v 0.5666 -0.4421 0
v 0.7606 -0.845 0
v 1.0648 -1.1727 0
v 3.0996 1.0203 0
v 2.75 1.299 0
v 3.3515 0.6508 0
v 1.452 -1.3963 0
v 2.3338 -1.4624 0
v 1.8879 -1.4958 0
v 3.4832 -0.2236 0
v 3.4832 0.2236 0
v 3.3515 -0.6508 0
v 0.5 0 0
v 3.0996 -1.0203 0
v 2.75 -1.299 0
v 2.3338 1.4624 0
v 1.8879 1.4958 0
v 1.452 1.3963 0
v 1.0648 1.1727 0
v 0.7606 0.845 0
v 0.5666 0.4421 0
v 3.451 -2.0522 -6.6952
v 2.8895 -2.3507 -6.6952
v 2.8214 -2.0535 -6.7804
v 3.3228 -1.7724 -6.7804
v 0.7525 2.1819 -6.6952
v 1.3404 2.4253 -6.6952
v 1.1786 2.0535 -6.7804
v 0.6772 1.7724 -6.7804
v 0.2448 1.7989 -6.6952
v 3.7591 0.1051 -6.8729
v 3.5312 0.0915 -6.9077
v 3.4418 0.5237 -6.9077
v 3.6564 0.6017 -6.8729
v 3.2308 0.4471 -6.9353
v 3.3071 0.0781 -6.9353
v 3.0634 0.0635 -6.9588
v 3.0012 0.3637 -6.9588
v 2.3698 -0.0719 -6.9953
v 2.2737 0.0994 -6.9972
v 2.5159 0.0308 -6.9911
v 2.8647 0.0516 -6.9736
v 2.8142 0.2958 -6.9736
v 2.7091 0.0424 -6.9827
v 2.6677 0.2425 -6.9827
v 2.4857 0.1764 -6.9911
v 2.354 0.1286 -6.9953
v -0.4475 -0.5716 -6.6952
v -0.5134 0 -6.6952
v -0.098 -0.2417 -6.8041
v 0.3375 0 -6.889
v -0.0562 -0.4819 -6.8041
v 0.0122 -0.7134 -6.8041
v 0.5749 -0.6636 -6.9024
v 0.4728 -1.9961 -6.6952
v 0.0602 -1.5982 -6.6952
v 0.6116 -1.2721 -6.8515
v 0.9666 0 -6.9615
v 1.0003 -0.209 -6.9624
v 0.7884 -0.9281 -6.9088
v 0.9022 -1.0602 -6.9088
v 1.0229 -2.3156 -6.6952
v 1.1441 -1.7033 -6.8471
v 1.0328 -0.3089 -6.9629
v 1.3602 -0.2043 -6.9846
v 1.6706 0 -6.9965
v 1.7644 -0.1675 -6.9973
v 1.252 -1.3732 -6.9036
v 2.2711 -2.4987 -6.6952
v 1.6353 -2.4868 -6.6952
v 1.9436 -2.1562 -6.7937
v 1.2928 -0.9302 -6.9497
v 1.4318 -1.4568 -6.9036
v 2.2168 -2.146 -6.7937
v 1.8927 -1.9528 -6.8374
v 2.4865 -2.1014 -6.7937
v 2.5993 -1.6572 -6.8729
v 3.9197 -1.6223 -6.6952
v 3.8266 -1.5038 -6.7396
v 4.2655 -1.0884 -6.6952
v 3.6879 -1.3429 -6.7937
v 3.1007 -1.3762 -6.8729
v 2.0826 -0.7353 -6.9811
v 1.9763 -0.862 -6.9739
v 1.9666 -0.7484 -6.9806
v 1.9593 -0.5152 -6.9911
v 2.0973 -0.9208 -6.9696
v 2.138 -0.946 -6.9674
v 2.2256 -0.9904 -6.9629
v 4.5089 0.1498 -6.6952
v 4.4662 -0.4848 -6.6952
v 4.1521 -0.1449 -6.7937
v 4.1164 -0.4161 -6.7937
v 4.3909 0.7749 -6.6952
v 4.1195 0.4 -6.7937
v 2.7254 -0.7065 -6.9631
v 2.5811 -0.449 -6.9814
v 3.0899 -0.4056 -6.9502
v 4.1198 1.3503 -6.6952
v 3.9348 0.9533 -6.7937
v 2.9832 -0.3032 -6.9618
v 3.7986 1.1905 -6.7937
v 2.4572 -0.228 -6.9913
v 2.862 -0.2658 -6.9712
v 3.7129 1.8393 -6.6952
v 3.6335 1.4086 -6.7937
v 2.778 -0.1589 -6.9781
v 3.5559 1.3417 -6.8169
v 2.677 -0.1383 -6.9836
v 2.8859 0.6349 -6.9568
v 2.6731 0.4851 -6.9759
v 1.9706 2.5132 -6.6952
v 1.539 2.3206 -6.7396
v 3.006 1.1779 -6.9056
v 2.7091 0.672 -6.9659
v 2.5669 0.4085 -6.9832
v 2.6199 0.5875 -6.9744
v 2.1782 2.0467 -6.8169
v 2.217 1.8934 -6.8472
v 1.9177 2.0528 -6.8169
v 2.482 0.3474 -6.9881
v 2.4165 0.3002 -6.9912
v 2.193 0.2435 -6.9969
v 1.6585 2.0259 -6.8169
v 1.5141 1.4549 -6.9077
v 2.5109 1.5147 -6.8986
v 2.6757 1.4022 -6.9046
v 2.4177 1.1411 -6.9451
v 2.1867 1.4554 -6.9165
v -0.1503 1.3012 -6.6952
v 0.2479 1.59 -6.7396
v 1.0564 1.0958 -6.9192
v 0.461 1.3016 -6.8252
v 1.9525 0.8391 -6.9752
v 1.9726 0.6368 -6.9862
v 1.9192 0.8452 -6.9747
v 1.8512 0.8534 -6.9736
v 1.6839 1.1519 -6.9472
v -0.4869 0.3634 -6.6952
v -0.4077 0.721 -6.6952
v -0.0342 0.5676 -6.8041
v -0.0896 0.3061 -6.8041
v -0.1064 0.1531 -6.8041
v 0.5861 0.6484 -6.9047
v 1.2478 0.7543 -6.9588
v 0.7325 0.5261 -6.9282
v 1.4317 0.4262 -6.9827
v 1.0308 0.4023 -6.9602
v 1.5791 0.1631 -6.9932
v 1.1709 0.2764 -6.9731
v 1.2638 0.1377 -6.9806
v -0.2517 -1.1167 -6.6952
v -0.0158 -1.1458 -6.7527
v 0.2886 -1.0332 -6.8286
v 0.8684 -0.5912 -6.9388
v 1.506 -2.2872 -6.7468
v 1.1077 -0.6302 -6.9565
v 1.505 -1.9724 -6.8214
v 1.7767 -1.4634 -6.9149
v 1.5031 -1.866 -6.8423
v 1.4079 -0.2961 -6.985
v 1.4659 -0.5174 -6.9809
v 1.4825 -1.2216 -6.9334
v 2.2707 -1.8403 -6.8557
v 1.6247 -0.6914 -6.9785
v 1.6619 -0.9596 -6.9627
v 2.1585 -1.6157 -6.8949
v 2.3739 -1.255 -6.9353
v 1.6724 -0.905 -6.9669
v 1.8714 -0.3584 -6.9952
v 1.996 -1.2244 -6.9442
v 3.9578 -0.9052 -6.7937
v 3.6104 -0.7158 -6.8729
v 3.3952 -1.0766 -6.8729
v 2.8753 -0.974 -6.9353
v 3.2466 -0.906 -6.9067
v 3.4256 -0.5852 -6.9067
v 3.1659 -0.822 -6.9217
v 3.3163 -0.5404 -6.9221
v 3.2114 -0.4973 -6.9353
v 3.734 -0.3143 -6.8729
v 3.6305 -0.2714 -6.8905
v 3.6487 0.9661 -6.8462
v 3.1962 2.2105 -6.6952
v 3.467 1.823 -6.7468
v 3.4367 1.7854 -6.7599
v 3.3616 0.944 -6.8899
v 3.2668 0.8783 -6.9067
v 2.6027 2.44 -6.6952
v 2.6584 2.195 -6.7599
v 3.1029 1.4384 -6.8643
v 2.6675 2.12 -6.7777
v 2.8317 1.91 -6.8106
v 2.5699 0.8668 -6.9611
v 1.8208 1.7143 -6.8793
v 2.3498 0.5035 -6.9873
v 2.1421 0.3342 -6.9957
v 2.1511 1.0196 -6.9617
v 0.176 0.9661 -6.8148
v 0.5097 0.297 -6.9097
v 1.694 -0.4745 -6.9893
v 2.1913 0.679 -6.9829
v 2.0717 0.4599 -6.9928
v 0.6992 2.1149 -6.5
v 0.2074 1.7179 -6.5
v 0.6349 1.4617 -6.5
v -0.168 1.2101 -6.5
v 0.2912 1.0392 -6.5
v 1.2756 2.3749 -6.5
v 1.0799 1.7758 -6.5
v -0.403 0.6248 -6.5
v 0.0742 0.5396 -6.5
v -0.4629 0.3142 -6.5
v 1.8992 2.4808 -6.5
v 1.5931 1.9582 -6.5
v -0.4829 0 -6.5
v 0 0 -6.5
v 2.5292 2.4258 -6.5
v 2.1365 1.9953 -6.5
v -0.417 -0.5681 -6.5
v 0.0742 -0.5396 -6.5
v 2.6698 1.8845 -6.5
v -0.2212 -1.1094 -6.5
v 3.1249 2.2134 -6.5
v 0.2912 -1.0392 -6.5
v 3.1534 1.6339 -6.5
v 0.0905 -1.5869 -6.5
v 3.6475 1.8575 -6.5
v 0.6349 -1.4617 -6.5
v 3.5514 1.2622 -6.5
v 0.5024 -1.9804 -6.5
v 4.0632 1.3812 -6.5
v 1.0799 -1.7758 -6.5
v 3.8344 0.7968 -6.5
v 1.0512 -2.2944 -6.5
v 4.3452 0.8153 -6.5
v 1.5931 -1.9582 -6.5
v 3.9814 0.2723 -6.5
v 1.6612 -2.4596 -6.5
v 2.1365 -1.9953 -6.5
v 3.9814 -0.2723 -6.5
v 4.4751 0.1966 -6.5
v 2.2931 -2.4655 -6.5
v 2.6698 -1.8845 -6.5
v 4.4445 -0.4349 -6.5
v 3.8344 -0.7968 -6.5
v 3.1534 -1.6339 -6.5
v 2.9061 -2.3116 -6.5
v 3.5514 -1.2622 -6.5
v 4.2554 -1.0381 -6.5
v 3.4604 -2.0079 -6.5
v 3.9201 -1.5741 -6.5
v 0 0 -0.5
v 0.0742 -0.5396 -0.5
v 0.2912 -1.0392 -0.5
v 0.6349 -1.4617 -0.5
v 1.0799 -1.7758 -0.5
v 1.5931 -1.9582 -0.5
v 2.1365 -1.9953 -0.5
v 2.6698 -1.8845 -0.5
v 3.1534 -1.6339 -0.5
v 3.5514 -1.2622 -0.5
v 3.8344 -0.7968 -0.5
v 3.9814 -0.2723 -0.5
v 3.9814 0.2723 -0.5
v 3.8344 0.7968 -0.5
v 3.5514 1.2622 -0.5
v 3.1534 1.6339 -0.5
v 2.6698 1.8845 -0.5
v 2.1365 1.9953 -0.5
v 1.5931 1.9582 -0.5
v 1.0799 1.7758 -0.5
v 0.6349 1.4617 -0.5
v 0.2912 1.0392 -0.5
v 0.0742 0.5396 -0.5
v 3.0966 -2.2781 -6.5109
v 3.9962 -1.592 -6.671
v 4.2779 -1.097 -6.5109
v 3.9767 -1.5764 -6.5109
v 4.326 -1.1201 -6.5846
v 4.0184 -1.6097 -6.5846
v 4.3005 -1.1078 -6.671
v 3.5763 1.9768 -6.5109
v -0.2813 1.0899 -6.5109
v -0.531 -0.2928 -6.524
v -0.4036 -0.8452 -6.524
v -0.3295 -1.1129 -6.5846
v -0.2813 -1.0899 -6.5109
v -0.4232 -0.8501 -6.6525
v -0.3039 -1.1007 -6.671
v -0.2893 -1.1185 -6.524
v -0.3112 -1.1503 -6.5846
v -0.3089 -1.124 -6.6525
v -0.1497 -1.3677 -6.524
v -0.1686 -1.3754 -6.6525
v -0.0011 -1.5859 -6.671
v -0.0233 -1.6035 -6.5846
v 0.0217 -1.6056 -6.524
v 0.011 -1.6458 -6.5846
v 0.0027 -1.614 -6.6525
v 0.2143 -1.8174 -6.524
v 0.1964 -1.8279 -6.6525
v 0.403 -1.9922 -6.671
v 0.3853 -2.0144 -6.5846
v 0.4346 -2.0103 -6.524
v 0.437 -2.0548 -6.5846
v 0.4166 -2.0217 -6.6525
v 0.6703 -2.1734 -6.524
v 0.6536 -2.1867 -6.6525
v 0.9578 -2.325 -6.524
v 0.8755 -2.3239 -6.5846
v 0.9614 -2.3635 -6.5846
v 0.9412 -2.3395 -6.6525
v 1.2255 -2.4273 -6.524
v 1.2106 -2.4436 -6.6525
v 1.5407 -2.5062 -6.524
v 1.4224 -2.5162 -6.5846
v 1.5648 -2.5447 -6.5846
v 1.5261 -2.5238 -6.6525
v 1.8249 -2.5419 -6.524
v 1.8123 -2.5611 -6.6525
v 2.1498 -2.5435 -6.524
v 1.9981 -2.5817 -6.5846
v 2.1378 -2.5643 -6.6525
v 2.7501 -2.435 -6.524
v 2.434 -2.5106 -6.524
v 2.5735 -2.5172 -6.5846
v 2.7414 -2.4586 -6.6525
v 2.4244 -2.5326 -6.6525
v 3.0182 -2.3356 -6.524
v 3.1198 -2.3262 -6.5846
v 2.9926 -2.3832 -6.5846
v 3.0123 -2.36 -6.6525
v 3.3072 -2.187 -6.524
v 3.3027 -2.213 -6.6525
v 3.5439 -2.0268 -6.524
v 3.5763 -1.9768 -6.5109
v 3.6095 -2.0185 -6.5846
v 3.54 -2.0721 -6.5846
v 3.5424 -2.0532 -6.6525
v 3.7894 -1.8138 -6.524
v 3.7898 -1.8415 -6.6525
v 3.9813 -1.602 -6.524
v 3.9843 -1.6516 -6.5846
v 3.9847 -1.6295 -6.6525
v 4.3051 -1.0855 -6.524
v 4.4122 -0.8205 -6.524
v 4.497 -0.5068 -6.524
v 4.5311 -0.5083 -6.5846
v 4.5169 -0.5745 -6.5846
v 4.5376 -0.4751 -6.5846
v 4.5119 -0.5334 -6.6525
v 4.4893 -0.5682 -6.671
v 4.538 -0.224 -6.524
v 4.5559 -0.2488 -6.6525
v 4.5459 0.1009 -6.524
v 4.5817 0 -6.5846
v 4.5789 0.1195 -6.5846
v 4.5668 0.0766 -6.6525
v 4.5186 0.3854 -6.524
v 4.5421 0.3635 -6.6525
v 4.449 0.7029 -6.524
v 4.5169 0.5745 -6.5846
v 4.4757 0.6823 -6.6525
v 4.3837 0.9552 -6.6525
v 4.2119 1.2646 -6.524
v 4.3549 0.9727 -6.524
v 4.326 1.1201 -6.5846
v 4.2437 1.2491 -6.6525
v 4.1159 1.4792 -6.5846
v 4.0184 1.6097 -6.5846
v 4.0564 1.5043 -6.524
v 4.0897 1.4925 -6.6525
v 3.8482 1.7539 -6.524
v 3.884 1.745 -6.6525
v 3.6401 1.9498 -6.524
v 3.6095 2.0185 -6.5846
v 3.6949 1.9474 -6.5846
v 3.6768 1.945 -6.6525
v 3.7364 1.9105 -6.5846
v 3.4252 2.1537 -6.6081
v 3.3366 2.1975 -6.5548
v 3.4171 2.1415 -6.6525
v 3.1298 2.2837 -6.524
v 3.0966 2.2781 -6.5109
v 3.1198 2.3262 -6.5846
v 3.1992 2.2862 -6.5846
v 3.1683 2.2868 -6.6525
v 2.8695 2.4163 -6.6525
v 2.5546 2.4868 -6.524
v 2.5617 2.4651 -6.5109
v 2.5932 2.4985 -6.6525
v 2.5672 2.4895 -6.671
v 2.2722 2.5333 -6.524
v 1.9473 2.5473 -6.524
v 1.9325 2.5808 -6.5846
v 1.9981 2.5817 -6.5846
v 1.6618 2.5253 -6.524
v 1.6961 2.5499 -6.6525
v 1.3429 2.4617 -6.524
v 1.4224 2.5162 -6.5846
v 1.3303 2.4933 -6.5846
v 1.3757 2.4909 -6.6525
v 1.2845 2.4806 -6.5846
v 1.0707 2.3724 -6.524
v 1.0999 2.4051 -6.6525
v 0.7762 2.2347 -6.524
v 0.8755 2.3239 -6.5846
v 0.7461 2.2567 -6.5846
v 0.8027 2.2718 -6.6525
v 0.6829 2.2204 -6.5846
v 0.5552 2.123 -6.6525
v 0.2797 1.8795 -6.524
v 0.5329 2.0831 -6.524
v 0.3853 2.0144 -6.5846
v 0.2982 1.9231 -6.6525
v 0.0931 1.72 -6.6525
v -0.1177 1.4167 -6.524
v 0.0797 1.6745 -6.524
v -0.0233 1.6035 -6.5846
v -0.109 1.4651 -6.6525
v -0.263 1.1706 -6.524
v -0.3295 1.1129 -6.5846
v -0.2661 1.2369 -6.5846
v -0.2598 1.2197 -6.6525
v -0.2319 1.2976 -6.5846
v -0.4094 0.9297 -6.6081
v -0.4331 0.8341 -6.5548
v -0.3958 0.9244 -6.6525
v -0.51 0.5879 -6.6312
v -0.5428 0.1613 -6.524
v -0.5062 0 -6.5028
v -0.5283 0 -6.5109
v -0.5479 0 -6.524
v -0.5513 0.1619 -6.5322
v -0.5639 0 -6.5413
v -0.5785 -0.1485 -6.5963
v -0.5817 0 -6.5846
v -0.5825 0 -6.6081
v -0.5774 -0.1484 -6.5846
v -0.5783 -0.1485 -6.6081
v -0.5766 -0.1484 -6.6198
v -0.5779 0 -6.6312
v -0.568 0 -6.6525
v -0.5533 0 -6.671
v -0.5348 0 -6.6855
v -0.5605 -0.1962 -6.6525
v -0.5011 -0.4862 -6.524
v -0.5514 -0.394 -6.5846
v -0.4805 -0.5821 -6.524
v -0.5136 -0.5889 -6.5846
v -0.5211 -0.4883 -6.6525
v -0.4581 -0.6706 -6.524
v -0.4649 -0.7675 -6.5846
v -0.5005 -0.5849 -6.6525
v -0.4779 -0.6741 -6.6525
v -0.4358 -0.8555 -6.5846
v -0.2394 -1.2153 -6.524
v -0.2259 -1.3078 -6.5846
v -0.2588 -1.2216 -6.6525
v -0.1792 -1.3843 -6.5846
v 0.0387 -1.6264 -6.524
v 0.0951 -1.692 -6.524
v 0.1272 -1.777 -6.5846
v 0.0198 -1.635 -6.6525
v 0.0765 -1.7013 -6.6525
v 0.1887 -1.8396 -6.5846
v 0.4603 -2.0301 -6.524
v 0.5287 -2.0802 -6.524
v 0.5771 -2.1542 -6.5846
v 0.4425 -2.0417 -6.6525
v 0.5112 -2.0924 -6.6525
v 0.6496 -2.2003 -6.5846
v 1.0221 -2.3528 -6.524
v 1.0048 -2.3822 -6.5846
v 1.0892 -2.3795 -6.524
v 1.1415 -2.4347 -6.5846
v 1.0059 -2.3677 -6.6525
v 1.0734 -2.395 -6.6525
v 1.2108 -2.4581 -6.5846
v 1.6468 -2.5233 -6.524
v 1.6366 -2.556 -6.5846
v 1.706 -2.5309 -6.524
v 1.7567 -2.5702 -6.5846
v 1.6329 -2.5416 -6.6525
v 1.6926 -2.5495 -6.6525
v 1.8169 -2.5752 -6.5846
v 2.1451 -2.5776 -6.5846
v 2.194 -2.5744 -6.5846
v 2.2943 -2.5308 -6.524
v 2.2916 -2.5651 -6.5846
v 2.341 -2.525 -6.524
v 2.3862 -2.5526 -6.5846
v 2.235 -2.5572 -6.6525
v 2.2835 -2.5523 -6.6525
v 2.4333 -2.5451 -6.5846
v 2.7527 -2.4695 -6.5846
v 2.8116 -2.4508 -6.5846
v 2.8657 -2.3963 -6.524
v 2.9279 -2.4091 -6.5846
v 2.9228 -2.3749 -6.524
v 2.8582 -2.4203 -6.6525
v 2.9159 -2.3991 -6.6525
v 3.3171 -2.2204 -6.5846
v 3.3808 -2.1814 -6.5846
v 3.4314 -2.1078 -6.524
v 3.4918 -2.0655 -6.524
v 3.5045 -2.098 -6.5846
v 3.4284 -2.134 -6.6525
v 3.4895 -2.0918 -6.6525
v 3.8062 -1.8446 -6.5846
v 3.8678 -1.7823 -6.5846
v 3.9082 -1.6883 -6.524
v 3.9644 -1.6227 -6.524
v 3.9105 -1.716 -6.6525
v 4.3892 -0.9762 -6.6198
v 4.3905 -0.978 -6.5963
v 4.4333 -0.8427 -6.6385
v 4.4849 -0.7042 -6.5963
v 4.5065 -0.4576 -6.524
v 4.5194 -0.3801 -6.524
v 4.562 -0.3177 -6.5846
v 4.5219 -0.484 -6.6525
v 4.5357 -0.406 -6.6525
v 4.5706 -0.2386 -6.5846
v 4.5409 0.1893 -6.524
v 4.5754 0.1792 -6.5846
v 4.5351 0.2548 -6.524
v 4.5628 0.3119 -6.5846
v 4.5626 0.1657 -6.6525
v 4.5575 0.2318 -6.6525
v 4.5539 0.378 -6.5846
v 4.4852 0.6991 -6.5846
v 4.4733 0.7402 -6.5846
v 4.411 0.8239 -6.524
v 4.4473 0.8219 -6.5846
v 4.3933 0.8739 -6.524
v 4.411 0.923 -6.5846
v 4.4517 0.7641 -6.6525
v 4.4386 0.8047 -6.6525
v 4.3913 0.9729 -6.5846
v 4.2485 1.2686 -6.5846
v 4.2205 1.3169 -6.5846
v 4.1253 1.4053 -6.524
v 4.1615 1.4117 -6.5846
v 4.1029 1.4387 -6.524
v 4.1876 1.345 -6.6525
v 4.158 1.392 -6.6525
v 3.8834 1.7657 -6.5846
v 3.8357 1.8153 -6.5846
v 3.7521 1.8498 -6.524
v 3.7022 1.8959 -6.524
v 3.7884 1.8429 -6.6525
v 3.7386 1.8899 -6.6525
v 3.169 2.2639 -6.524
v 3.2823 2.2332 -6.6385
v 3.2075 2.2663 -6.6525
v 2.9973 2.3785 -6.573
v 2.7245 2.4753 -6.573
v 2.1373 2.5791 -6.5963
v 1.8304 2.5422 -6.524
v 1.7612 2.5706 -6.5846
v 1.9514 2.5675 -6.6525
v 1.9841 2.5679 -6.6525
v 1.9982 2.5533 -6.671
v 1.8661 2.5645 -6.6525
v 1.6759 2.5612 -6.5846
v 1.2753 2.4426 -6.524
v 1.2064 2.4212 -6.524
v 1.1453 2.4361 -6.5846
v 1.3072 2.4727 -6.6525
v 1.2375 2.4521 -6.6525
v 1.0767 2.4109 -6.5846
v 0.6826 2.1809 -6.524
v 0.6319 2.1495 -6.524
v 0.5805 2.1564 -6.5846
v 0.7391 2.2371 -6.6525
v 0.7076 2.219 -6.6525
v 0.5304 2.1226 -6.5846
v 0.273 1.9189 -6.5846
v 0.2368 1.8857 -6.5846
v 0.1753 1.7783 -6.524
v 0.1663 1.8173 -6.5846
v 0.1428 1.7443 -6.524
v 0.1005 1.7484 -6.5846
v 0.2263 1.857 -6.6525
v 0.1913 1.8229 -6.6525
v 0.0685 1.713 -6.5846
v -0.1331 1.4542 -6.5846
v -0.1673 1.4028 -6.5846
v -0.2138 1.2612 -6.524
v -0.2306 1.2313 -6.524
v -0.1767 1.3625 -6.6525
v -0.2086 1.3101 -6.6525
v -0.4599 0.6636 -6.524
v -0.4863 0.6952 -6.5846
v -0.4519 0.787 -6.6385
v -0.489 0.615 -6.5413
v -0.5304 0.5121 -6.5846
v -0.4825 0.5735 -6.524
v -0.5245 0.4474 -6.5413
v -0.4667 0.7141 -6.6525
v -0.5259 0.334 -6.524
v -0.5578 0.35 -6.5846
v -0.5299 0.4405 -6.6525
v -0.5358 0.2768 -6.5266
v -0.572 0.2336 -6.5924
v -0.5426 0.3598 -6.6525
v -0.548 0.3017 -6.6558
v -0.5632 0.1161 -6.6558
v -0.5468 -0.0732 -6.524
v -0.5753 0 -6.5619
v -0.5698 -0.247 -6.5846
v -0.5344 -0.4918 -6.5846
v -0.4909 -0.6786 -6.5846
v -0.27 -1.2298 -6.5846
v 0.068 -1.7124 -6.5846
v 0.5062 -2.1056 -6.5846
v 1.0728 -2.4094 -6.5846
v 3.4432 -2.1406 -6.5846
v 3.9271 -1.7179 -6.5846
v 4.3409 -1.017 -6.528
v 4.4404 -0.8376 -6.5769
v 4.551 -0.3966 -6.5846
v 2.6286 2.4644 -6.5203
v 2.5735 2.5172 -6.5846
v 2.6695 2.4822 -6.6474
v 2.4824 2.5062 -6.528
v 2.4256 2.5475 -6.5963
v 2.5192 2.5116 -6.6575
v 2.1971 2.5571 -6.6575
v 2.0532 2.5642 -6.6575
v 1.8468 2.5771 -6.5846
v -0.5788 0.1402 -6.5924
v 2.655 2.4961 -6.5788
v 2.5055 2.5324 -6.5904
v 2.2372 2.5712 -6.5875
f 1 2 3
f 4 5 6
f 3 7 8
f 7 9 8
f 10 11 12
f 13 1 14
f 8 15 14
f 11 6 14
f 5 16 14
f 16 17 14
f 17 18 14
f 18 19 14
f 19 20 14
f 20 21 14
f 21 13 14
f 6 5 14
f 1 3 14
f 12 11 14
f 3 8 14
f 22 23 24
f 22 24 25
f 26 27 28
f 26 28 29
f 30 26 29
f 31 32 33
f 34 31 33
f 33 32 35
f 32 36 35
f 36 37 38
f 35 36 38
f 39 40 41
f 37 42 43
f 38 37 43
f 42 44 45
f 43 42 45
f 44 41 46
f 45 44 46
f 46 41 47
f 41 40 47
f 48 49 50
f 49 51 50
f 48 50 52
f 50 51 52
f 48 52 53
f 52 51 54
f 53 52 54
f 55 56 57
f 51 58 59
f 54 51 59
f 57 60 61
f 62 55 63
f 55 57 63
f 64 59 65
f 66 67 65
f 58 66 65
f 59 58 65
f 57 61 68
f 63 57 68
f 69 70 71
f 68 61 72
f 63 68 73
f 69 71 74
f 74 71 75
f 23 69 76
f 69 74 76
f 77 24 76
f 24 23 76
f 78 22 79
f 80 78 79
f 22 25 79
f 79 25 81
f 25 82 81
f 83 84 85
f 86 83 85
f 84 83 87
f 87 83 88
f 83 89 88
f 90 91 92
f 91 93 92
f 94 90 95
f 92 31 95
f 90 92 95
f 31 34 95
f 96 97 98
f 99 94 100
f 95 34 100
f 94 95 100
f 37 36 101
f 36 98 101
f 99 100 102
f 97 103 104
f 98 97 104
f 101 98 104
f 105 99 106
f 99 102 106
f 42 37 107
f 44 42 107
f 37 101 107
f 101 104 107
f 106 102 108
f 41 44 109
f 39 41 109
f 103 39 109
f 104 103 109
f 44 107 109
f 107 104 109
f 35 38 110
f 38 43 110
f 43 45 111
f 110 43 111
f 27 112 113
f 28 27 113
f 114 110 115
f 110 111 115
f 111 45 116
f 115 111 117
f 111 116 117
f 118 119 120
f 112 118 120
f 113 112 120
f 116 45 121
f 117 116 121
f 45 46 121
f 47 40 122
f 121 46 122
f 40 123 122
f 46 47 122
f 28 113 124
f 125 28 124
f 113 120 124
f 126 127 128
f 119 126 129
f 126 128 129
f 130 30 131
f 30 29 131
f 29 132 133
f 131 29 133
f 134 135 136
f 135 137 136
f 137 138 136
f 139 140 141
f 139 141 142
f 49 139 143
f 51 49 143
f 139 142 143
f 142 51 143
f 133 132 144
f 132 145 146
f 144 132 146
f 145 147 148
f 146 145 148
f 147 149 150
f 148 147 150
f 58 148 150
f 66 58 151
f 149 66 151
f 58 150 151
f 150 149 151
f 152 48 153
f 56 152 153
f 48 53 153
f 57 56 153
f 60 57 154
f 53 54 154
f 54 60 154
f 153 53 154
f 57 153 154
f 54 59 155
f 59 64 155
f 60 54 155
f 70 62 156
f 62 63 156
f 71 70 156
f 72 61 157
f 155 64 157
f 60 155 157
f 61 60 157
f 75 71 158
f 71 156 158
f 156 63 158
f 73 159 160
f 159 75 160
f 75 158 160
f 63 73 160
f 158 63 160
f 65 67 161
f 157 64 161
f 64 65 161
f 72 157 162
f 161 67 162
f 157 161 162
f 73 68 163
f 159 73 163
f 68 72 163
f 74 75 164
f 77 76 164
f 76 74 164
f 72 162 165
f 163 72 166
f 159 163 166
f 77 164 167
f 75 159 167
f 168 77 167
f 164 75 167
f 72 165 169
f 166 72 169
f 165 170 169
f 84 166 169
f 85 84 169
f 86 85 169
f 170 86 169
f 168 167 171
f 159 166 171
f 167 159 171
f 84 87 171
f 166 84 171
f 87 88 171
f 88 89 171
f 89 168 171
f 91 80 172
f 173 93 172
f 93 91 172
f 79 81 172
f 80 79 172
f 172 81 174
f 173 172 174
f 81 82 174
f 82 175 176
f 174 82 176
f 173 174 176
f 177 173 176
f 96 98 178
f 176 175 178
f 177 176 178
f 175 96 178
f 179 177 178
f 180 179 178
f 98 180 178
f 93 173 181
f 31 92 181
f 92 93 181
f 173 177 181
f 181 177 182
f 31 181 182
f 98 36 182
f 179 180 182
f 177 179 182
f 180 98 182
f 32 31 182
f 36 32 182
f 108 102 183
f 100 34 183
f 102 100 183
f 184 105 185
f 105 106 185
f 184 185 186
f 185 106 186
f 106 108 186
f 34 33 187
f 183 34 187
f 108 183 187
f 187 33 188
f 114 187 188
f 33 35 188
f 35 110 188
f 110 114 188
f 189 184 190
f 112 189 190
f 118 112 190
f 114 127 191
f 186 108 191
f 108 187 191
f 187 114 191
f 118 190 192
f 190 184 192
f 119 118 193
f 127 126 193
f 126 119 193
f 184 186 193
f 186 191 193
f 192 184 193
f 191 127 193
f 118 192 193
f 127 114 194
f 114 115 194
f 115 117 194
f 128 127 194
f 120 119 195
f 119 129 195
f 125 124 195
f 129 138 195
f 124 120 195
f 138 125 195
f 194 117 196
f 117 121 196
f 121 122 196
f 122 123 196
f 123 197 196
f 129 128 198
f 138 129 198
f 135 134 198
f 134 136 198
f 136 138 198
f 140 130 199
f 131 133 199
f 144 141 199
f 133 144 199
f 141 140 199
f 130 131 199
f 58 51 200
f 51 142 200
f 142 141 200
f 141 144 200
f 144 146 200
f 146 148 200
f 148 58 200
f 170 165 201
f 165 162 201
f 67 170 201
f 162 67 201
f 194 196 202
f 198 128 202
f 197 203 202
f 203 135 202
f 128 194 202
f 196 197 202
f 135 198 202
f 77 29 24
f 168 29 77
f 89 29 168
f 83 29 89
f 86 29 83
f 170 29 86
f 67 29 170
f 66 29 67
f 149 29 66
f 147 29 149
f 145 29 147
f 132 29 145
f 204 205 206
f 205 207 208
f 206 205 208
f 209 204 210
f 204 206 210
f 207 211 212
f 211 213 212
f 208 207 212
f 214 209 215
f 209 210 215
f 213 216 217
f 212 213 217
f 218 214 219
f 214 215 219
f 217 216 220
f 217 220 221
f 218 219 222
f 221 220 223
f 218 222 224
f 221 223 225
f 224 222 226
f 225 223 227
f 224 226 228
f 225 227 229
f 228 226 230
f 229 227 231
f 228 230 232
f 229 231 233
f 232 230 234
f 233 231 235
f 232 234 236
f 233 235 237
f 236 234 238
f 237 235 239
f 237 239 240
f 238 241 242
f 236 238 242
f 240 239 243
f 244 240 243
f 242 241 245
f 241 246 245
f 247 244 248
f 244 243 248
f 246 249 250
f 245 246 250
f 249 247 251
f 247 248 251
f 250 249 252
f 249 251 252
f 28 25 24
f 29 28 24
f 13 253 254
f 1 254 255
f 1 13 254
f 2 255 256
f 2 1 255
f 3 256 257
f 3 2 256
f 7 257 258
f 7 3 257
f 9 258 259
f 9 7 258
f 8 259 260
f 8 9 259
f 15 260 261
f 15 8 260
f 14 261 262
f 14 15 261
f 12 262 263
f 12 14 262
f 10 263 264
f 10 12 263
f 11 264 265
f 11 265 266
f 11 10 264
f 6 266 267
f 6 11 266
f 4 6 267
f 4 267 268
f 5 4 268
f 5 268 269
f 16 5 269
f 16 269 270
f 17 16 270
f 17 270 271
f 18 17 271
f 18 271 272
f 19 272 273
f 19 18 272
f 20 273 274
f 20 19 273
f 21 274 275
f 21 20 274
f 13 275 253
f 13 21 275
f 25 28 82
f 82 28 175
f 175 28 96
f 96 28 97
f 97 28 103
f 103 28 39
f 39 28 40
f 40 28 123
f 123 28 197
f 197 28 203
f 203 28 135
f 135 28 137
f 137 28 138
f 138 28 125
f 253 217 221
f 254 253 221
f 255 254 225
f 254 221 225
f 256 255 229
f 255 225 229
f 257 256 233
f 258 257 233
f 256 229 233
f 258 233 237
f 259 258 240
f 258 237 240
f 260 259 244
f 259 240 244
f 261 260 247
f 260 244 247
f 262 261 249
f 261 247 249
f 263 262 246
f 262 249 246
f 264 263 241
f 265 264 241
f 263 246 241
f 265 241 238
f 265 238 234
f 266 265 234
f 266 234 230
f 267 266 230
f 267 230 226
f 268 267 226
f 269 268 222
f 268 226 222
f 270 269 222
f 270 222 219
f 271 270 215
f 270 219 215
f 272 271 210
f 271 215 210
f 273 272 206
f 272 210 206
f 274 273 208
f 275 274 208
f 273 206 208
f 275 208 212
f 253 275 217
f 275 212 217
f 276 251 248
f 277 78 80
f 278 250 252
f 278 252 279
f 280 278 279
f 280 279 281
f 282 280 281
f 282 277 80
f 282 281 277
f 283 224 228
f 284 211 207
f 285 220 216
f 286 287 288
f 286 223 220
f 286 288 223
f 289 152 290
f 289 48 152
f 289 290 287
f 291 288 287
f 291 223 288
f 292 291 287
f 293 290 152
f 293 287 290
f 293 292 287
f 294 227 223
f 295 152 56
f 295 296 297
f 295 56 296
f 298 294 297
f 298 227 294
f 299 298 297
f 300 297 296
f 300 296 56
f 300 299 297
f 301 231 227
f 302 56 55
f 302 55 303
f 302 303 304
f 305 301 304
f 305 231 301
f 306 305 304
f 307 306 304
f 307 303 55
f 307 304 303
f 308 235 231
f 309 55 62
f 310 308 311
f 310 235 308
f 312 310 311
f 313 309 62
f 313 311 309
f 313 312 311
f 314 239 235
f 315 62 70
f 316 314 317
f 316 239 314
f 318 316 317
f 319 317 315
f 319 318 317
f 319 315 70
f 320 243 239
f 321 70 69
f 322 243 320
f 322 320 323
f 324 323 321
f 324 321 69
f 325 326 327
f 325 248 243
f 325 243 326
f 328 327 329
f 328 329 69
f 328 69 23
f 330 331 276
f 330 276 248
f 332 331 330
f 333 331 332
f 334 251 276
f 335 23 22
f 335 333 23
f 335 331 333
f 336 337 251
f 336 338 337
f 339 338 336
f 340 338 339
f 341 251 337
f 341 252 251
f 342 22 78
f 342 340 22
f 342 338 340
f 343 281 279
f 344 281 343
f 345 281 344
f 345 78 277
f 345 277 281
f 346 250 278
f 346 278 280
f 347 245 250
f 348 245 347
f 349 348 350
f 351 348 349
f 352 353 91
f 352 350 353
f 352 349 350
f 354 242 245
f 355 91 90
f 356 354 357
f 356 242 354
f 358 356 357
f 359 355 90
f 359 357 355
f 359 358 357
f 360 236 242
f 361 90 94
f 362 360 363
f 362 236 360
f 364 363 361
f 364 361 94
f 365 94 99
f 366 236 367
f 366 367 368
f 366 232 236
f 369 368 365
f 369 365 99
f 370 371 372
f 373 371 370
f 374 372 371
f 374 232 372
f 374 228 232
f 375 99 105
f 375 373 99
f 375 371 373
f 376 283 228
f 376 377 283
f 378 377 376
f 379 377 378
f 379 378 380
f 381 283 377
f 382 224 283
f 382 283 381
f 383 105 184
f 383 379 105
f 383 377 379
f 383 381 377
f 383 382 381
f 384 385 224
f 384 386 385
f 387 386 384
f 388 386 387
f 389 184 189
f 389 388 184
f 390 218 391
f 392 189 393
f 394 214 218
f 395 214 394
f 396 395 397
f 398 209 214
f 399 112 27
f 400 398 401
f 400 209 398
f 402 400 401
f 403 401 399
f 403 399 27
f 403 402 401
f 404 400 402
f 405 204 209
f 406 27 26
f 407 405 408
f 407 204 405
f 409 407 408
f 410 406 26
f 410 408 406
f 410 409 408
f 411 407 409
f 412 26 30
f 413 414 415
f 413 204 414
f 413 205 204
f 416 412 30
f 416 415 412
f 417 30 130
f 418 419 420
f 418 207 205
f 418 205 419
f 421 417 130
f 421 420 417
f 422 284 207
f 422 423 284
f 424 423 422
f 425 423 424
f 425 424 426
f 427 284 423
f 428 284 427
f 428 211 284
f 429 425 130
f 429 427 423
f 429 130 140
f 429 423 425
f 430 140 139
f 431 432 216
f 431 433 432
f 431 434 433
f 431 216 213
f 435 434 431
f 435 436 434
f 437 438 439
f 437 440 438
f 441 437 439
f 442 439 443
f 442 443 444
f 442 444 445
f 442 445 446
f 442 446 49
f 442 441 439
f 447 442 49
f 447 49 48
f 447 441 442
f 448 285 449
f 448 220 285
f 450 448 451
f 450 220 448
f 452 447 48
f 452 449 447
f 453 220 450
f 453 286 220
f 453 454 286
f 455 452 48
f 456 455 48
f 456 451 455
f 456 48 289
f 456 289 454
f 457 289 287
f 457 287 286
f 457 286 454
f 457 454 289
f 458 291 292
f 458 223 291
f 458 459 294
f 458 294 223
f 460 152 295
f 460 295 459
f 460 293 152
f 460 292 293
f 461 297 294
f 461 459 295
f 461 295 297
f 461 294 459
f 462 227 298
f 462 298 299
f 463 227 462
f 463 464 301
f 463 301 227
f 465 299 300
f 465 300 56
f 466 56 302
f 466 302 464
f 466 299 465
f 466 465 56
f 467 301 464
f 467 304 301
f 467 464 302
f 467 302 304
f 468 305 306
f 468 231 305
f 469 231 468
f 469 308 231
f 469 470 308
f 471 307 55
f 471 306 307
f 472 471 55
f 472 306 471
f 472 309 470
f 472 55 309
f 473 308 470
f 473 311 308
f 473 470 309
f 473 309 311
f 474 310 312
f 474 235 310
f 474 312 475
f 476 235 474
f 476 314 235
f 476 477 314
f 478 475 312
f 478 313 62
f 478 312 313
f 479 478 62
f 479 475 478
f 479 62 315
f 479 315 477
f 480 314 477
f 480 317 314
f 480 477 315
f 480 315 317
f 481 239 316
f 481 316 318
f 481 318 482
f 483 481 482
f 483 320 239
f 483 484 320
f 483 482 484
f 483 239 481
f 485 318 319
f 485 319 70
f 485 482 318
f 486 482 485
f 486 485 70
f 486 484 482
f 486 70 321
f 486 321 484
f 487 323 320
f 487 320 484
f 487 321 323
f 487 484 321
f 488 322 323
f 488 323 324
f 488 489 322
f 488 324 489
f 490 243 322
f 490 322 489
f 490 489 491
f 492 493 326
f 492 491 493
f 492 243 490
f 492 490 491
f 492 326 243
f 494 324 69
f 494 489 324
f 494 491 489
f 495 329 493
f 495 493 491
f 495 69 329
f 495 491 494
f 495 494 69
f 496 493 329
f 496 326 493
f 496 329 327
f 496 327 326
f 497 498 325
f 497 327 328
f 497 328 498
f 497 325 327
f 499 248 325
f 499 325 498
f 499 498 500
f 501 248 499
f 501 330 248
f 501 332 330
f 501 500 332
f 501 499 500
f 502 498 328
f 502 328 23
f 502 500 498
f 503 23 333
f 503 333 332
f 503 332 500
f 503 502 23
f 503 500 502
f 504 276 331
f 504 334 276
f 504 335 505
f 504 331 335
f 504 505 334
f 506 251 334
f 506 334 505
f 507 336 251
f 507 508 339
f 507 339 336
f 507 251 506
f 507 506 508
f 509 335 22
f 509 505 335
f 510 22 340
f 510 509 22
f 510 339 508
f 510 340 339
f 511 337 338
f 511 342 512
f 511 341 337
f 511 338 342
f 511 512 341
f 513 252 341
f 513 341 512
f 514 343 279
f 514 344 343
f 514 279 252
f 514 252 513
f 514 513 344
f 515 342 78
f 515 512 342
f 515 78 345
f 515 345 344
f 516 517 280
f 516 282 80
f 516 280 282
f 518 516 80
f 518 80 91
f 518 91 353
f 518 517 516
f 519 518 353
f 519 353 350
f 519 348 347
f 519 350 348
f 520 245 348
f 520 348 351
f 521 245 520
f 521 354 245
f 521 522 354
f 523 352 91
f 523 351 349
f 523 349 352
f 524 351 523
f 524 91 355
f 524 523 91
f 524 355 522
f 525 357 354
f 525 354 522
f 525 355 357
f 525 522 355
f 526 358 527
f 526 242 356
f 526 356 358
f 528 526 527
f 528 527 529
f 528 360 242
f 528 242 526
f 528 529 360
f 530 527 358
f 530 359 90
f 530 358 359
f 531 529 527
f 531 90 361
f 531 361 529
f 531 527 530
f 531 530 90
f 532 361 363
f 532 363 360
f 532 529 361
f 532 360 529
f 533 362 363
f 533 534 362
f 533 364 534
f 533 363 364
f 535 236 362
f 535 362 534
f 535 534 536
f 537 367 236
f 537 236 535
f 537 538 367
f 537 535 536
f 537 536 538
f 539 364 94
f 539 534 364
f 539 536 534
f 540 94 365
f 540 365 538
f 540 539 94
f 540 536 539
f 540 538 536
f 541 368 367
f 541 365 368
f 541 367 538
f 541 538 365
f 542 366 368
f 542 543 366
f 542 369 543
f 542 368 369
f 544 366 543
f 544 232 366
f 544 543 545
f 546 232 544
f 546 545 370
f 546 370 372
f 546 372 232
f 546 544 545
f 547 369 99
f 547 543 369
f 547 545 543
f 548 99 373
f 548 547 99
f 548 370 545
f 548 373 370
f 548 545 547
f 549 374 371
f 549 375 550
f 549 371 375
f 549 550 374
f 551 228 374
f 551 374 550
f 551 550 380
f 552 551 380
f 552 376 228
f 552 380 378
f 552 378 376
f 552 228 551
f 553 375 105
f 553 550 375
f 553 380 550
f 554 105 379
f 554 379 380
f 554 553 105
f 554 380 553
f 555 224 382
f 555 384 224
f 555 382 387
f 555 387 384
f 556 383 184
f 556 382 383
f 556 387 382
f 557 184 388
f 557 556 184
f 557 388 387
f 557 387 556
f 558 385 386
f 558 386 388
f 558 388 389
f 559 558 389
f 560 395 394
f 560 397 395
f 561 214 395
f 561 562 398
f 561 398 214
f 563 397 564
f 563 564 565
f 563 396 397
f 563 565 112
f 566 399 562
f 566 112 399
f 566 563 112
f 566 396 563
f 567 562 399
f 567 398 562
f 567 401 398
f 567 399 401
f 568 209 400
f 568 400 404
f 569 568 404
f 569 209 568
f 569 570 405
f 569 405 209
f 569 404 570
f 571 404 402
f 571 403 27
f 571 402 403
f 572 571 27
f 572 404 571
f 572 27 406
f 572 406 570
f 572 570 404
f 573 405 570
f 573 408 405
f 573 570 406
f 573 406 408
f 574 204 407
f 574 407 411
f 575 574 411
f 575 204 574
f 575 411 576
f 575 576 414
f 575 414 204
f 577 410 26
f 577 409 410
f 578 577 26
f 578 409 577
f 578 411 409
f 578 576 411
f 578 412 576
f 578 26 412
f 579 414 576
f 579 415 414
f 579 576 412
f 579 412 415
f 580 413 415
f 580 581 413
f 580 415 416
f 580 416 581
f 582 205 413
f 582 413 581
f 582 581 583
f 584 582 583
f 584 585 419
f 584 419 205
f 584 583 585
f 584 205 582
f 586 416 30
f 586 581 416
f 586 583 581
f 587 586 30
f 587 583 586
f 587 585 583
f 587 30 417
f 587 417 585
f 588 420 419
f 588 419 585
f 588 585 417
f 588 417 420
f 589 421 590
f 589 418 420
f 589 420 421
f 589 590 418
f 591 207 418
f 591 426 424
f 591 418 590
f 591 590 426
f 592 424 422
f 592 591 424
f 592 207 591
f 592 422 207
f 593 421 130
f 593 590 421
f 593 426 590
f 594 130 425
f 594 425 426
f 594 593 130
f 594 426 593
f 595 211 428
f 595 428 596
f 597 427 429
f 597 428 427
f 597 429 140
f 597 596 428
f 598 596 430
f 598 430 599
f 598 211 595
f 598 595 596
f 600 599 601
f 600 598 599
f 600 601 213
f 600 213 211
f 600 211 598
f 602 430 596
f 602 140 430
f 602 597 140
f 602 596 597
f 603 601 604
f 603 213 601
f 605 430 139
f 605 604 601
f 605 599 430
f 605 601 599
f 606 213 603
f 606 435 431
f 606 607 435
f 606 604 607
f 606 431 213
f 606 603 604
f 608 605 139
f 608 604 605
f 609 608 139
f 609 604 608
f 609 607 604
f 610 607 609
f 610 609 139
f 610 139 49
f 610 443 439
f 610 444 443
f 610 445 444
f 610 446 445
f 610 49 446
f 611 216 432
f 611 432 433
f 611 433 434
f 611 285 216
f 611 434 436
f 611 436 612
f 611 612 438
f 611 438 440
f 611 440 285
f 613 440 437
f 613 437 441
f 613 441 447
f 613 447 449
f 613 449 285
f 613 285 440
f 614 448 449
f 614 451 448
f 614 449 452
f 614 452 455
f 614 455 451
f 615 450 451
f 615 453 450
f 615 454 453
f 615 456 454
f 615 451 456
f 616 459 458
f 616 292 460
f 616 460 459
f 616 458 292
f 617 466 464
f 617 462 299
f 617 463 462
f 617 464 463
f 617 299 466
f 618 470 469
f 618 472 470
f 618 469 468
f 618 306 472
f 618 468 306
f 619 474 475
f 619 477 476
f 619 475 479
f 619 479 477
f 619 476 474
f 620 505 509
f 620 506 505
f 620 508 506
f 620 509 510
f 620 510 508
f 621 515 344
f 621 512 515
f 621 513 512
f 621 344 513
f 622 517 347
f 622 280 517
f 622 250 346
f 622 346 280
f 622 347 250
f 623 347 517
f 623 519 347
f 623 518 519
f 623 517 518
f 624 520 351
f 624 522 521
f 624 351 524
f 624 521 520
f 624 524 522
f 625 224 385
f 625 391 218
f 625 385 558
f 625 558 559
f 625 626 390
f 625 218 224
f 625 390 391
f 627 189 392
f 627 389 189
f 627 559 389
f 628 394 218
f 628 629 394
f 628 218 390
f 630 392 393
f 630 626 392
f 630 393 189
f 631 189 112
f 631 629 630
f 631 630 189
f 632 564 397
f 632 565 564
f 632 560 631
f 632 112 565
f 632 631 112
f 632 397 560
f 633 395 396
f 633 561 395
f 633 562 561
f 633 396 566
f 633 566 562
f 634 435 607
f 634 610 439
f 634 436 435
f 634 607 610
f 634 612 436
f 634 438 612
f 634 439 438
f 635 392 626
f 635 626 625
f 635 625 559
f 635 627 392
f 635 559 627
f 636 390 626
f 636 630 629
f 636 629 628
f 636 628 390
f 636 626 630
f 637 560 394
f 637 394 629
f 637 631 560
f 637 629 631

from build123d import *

# Parameters (mm, degrees)
CONG_1_R                = 0.1
CHANFREIN1_SIZE         = 0.5
ESQUISSE4_W             = 0.574782946
ESQUISSE4_H             = 1.352018642
ENL_V_MAT_EXTRU_1_DEPTH = 10


with BuildPart() as part:
    # Esquisse1 → Révolution1 (revolve)
    with BuildSketch(Plane(origin=(0, 0, 0), x_dir=(1, 0, 0), z_dir=(0, 1, 0))):
        with BuildLine():
            Line((0, 0), (0, 6.5))
            Line((0, 6.5), (-1, 6.5))
            add(Edge.make_bspline(
                [(-1, 6.5), (0, 7), (2, 7)],
                knots=[0, 0, 0, 1, 1, 1], degree=2))
            Line((2, 7), (2, 0))
            Line((2, 0), (0, 0))
        make_face()
    revolve(axis=Axis((2, 0, -7), (0, 0, 1)))

    # Congé1
    cong_1_edges = [part.edges().sort_by_distance(p)[0] for p in [
        (5, 0, -6.5),
    ]]
    fillet(cong_1_edges, radius=CONG_1_R)

    # Chanfrein1
    chanfrein1_edges = [part.edges().sort_by_distance(p)[0] for p in [
        (4, 0, 0),
    ]]
    chamfer(chanfrein1_edges, length=CHANFREIN1_SIZE)

    # Esquisse4 → Enlèv. mat.-Extru.1 (cut, symmetric)
    with BuildSketch(Plane(origin=(0.478013725, -0.852953884, 0), x_dir=(-0.8723492061003342, -0.4888832811787661, 0), z_dir=(-0.48888328117876617, 0.8723492061003343, 0))):
        with Locations((-1.744698412, -7.456425035)):
            Rectangle(ESQUISSE4_W, ESQUISSE4_H)
    extrude(amount=ENL_V_MAT_EXTRU_1_DEPTH, both=True, mode=Mode.SUBTRACT)


solid = part.part
